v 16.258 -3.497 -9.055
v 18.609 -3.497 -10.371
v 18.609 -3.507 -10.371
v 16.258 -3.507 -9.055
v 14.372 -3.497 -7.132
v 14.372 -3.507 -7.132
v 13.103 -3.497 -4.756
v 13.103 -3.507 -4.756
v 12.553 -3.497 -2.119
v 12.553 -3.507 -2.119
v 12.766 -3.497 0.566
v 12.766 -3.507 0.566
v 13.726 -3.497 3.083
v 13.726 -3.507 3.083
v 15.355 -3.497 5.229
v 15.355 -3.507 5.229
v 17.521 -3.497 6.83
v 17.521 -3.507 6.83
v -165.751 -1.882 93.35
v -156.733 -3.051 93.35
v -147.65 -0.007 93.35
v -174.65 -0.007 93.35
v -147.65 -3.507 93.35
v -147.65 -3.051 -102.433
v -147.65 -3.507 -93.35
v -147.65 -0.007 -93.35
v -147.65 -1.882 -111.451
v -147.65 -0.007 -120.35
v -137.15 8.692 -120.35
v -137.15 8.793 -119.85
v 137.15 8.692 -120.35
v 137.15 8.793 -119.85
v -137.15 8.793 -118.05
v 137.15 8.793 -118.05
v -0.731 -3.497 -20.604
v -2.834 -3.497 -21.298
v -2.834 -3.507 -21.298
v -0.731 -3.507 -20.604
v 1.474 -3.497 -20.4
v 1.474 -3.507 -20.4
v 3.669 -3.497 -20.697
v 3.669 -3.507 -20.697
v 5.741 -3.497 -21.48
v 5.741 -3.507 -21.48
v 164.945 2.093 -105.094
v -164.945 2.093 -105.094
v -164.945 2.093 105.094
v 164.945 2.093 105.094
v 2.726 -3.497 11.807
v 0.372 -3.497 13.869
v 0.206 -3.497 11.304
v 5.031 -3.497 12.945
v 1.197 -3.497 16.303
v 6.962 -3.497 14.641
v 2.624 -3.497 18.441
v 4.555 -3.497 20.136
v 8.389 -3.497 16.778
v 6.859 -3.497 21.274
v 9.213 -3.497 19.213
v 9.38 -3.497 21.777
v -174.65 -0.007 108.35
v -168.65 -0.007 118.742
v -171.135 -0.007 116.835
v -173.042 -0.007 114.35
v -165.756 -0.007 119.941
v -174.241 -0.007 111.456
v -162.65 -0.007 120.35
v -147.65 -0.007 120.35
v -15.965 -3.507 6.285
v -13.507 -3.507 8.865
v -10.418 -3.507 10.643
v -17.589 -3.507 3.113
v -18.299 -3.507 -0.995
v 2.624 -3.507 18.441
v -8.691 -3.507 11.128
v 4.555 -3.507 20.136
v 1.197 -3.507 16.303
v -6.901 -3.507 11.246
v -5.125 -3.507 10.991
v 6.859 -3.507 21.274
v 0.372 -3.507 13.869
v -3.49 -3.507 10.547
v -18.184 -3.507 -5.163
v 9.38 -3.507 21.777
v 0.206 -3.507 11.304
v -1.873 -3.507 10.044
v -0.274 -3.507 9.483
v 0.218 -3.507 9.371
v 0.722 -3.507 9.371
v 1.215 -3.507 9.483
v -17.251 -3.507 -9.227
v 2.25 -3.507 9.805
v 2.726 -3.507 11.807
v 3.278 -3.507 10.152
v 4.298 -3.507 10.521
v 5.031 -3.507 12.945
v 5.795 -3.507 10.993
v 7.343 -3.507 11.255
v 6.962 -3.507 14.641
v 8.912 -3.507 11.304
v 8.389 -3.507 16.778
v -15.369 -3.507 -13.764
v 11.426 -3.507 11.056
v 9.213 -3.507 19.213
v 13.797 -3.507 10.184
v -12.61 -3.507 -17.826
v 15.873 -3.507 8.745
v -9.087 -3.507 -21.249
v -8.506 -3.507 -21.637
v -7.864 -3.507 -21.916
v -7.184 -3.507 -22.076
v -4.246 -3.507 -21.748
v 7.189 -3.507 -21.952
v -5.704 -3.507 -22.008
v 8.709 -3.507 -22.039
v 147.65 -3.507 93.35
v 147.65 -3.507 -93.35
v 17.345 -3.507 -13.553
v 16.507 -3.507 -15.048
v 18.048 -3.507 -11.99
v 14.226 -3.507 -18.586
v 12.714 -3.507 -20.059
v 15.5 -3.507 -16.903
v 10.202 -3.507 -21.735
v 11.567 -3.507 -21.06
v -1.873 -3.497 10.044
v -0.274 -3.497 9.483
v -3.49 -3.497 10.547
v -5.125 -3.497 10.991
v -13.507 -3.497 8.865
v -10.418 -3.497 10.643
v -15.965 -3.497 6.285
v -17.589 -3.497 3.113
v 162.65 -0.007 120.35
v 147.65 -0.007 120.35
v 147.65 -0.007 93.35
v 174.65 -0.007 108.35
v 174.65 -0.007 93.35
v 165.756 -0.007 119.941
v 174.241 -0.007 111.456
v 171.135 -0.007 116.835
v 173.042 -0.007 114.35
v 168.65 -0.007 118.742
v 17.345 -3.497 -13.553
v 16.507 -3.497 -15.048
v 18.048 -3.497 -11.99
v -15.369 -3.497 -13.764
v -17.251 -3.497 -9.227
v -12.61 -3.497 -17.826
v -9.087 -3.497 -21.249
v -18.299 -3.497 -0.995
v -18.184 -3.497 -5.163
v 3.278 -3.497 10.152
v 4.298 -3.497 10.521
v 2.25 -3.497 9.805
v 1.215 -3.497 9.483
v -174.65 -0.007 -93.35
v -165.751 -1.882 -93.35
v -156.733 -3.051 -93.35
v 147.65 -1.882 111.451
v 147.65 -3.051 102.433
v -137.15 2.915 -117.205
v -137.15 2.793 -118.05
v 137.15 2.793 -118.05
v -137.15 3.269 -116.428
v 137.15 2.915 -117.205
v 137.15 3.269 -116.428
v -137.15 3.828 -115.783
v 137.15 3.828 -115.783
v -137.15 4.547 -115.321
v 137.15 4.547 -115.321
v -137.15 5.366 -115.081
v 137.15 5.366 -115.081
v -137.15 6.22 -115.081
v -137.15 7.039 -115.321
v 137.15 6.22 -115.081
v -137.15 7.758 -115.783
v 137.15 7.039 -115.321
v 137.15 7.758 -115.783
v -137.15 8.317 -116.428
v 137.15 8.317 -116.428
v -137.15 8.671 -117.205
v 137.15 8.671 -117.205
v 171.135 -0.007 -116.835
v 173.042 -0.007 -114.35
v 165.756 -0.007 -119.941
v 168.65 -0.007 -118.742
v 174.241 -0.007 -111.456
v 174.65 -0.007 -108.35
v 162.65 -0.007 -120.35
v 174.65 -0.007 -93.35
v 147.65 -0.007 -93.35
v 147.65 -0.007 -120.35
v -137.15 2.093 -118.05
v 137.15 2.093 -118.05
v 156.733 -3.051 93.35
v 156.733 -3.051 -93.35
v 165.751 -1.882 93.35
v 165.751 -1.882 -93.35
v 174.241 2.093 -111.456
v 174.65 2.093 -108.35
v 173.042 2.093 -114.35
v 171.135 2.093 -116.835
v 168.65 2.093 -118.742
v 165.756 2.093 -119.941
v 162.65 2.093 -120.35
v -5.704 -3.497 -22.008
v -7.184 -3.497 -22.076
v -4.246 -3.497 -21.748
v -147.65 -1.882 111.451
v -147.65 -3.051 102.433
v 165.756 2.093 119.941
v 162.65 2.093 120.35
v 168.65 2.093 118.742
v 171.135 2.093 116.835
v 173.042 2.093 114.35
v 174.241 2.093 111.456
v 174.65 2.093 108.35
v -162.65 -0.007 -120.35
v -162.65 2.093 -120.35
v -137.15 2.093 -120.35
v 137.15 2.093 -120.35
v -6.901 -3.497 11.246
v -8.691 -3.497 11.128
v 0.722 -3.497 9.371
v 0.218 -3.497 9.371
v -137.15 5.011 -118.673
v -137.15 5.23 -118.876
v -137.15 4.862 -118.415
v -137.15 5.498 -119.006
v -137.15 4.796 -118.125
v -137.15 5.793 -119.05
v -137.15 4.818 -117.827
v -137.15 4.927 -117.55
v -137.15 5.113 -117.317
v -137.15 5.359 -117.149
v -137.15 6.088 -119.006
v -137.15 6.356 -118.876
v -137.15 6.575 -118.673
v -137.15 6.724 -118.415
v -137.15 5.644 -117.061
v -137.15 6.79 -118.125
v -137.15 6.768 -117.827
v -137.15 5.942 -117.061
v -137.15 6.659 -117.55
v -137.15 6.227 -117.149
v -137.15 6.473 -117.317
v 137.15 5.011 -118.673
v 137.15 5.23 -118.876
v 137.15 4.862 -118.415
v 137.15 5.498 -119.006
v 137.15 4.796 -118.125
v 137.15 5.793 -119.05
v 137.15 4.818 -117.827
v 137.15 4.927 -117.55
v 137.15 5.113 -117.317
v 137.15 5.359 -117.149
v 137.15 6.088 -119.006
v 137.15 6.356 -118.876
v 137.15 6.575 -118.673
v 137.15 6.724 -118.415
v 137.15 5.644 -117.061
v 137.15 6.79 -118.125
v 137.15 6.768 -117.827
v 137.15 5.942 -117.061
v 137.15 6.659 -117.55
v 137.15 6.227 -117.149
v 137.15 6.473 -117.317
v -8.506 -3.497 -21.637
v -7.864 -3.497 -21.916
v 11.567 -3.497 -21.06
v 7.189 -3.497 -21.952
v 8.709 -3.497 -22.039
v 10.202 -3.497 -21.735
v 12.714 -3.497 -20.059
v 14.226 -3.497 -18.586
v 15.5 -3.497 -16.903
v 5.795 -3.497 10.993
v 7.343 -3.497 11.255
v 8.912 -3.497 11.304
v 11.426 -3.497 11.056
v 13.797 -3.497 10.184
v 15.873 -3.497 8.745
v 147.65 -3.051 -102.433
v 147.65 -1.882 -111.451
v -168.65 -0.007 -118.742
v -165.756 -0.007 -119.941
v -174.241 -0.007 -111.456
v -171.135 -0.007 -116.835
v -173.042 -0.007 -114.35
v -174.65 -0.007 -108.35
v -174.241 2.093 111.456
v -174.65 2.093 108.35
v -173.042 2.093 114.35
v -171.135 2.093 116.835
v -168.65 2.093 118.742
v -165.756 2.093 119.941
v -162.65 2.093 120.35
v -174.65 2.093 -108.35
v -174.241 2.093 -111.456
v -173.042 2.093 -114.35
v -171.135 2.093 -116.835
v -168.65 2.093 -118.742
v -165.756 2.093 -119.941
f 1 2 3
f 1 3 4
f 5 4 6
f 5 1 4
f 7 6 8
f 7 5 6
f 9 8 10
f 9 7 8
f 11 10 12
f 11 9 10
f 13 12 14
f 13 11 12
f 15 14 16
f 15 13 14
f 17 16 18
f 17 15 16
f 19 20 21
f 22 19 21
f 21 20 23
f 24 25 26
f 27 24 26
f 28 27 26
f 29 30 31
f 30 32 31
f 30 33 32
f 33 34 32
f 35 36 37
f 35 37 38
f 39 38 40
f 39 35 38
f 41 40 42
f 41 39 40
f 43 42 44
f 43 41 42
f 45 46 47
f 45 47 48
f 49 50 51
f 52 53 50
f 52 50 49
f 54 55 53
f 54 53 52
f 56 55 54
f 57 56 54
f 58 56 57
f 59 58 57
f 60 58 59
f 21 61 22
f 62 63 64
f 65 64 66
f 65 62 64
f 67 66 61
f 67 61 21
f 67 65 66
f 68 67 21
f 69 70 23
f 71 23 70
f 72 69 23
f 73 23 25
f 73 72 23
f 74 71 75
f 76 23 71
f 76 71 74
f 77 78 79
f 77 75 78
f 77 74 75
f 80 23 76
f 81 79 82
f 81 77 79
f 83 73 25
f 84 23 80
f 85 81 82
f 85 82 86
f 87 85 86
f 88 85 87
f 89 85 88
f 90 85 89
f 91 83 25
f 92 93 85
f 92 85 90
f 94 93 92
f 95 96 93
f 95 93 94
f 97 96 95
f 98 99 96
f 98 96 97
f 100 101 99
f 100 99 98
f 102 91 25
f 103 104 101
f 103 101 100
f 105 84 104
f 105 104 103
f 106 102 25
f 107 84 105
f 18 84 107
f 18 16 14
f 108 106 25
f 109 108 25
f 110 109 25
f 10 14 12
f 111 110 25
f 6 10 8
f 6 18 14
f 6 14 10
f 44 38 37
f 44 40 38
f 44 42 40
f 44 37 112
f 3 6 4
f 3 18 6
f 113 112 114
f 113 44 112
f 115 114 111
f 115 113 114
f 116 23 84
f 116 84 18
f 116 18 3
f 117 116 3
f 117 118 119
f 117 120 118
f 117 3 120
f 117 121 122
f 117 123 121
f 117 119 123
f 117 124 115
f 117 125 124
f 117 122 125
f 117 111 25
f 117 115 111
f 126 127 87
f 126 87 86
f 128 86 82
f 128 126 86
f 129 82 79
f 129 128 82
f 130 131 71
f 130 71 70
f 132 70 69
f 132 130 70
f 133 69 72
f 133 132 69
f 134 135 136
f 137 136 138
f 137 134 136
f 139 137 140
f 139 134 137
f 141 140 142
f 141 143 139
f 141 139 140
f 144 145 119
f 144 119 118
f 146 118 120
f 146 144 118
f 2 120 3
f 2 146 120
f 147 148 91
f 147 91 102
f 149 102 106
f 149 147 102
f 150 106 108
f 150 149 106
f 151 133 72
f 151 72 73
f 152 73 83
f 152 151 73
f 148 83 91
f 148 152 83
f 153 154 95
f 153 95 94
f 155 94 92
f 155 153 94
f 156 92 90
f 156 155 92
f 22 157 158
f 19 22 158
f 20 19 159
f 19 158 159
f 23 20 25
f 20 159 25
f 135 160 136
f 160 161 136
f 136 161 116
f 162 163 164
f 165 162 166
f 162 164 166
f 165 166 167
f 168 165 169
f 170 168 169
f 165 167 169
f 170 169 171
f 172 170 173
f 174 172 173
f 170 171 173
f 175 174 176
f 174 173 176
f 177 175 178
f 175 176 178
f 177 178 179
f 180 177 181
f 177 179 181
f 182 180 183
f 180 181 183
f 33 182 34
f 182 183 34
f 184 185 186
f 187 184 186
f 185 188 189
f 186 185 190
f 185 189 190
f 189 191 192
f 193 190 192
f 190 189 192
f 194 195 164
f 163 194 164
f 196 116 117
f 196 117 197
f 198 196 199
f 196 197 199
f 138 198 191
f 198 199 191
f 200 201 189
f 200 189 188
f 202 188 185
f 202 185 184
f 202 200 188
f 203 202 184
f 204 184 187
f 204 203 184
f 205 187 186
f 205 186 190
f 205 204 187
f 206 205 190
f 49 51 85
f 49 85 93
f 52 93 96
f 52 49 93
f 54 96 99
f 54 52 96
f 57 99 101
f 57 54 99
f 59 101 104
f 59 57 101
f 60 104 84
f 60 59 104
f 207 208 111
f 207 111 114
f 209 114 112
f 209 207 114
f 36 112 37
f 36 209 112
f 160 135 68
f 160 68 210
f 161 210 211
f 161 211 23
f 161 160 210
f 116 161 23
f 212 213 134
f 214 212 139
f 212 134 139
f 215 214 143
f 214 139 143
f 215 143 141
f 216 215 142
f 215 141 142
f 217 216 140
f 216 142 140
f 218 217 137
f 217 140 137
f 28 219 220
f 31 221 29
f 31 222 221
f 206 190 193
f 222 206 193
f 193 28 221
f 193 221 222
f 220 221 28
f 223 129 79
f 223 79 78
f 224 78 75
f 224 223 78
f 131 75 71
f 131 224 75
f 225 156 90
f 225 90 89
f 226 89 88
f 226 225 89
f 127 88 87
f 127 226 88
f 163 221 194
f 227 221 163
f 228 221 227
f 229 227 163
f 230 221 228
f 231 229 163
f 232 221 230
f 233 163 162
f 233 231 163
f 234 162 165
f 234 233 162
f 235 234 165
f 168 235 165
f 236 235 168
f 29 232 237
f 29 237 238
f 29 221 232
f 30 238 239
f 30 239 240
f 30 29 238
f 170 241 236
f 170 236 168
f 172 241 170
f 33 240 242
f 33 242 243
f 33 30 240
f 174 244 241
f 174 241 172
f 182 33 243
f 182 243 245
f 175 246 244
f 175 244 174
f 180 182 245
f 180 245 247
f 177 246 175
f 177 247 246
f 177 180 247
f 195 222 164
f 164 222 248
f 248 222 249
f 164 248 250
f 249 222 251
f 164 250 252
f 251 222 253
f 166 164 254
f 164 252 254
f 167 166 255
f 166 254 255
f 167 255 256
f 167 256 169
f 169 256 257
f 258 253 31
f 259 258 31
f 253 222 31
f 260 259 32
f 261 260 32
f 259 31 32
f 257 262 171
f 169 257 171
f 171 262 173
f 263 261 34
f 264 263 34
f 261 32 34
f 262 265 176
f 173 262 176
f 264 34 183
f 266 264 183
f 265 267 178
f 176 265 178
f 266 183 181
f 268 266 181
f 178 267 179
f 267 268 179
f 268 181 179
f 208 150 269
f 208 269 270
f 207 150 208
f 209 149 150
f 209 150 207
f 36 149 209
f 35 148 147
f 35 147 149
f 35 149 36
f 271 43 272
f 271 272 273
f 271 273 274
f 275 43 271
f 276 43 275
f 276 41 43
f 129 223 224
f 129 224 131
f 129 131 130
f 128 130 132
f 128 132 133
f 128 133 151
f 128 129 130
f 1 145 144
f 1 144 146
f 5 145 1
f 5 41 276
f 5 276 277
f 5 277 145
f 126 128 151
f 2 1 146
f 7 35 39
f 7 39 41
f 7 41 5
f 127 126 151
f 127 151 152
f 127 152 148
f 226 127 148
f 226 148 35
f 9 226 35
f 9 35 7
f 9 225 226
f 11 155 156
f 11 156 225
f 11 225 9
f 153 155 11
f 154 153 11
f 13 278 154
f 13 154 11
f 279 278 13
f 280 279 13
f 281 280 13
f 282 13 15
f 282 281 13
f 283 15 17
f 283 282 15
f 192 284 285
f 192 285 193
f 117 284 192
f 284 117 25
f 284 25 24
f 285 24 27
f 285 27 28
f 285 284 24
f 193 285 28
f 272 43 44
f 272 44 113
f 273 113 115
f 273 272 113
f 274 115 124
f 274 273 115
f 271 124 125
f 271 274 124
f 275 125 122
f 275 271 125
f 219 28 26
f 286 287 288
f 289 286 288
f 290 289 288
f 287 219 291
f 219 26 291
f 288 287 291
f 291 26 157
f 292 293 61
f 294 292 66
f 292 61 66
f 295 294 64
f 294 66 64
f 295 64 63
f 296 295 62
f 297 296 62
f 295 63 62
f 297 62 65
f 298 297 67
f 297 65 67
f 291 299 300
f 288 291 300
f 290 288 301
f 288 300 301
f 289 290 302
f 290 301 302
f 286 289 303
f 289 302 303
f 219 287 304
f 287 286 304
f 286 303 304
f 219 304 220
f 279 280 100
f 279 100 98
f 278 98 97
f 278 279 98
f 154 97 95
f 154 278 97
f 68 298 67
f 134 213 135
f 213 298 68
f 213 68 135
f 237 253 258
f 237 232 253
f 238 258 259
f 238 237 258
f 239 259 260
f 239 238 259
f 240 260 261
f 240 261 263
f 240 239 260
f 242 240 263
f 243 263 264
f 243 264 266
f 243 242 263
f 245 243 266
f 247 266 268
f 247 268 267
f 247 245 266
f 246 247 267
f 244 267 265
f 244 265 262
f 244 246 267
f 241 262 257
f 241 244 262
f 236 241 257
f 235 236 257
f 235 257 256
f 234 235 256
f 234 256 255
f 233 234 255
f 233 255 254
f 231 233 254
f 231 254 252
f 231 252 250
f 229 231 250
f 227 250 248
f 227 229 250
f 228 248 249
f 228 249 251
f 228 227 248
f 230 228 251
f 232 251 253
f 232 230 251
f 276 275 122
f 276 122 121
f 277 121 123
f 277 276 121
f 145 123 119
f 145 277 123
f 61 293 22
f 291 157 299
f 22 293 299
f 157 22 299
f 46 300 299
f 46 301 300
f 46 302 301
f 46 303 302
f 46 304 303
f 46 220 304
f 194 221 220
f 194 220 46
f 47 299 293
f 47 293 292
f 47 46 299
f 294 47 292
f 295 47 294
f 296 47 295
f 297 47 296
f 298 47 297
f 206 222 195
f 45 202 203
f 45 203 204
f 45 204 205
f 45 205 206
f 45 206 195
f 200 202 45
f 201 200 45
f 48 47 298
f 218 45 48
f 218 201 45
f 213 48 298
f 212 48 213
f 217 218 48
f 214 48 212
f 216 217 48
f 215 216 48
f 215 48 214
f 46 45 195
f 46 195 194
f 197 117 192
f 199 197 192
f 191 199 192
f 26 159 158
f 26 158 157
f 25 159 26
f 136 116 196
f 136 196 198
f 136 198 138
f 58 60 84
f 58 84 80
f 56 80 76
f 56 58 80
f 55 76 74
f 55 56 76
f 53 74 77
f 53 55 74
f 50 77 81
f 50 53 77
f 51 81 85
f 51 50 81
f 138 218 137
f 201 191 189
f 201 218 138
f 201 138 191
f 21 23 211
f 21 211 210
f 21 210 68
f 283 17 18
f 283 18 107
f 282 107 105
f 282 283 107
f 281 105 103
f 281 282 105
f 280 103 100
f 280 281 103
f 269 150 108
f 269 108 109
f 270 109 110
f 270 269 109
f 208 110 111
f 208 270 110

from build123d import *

# Parameters (mm, degrees)
BOSS_EXTRUDE1_DEPTH   = 174.65
BOSS_EXTRUDE2_DEPTH   = 295.3
BOSS_EXTRUDE2_2_DEPTH = 295.3
CUT_EXTRUDE1_DEPTH    = 564.747214252
FILLET1_R             = 12
CUT_EXTRUDE2_DEPTH    = 3.5
SKETCH6_R             = 1
BOSS_EXTRUDE3_DEPTH   = 137.15
SKETCH7_W             = 329.889597284
SKETCH7_H             = 210.188009182
CUT_EXTRUDE3_DEPTH    = 0.0001
CUT_EXTRUDE4_START    = -0.01
CUT_EXTRUDE4_DEPTH    = 0.01


# Read off the part's stored shape, not the designer's step: Cut-Extrude4
with BuildPart() as part:
    # Sketch1 → Boss-Extrude1 (new, symmetric)
    with BuildSketch(Plane(origin=(0, 0, 0), x_dir=(0, 0, -1), z_dir=(1, 0, 0))):
        with BuildLine():
            Line((120.35, 2.092995949), (-120.35, 2.092995949))
            Line((-120.35, 2.092995949), (-120.35, -0.007004051))
            ThreePointArc((-120.35, -0.007004051), (-106.953525194, -2.555626976), (-93.35, -3.507004051))
            Line((-93.35, -3.507004051), (93.35, -3.507004051))
            ThreePointArc((93.35, -3.507004051), (106.953525194, -2.555626976), (120.35, -0.007004051))
            Line((120.35, -0.007004051), (120.35, 2.092995949))
        make_face()
    extrude(amount=BOSS_EXTRUDE1_DEPTH, both=True)


with BuildPart() as body_2:
    # Sketch3 → Boss-Extrude2 (new body)
    with BuildSketch(Plane(origin=(0, 0, -120.35), x_dir=(-1, 0, 0), z_dir=(0, 0, -1))):
        with BuildLine():
            Line((174.65, -3.507004051), (174.65, -0.007004051))
            ThreePointArc((174.65, -0.007004051), (161.253525194, -2.555626976), (147.65, -3.507004051))
            Line((147.65, -3.507004051), (174.65, -3.507004051))
        make_face()
    extrude(amount=BOSS_EXTRUDE2_DEPTH)


with BuildPart() as body_3:
    # Sketch3 → Boss-Extrude2 2 (new body)
    with BuildSketch(Plane(origin=(0, 0, -120.35), x_dir=(-1, 0, 0), z_dir=(0, 0, -1))):
        with BuildLine():
            Line((-174.65, -3.507004051), (-147.65, -3.507004051))
            ThreePointArc((-147.65, -3.507004051), (-161.253525194, -2.555626976), (-174.65, -0.007004051))
            Line((-174.65, -0.007004051), (-174.65, -3.507004051))
        make_face()
    extrude(amount=BOSS_EXTRUDE2_2_DEPTH)


with BuildPart() as cut_extrude1_tool:
    # Sketch4 → Cut-Extrude1 (new, through all)
    with BuildSketch(Plane(origin=(0, 0, -415.65), x_dir=(-1, 0, 0), z_dir=(0, 0, -1))):
        with BuildLine():
            Line((-174.65, -0.007004051), (-174.65, -3.507004051))
            Line((-174.65, -3.507004051), (-147.65, -3.507004051))
            ThreePointArc((-147.65, -3.507004051), (-161.253525194, -2.555626976), (-174.65, -0.007004051))
        make_face()
        with BuildLine():
            Line((174.65, -3.507004051), (174.65, -0.007004051))
            ThreePointArc((174.65, -0.007004051), (161.253525194, -2.555626976), (147.65, -3.507004051))
            Line((147.65, -3.507004051), (174.65, -3.507004051))
        make_face()
    extrude(amount=-CUT_EXTRUDE1_DEPTH)


with BuildPart() as part_1:
    add(part.part)

    # Cut-Extrude1: cut by cut_extrude1_tool
    add(cut_extrude1_tool.part, mode=Mode.SUBTRACT)

    # Fillet1
    fillet1_edges = [part_1.edges().sort_by_distance(p)[0] for p in [
        (-174.65, 1.042995949, 120.35),
        (-174.65, 1.042995949, -120.35),
        (174.65, 1.042995949, -120.35),
        (174.65, 1.042995949, 120.35),
    ]]
    fillet(fillet1_edges, radius=FILLET1_R)

    # Sketch5 → Cut-Extrude2 (cut)
    with BuildSketch(Plane.XZ.offset(3.507004051)):
        Polygon((147.65, -93.35), (210.030677808, -93.35), (147.65, -135.593204027), align=None)
        Polygon((147.65, 93.35), (239.751162266, 93.35), (147.65, 176.927939597), align=None)
        Polygon((-147.65, -93.35), (-147.65, -130.932477463), (-221.764343706, -93.35), align=None)
        Polygon((-147.65, 93.35), (-147.65, 153.997058362), (-221.764343706, 93.35), align=None)
    extrude(amount=-CUT_EXTRUDE2_DEPTH, mode=Mode.SUBTRACT)

    # Sketch6 → Boss-Extrude3 (add, symmetric)
    with BuildSketch(Plane(origin=(0, 0, 0), x_dir=(0, 0, -1), z_dir=(1, 0, 0))):
        with BuildLine():
            Line((118.05, 2.092995949), (118.05, 2.792995949))
            ThreePointArc((118.05, 2.792995949), (115.05, 5.792995949), (118.05, 8.792995949))
            Line((118.05, 8.792995949), (119.85, 8.792995949))
            Line((119.85, 8.792995949), (120.35, 8.692497192))
            Line((120.35, 8.692497192), (120.35, 2.092995949))
            Line((120.35, 2.092995949), (118.05, 2.092995949))
        make_face()
        with Locations((118.05, 5.792995949)):
            Circle(SKETCH6_R, mode=Mode.SUBTRACT)
    extrude(amount=BOSS_EXTRUDE3_DEPTH, both=True)

    # Sketch7 → Cut-Extrude3 (cut)
    with BuildSketch(Plane(origin=(0, 2.092995949, 0), x_dir=(1, 0, 0), z_dir=(0, 1, 0))):
        Rectangle(SKETCH7_W, SKETCH7_H)
    extrude(amount=-CUT_EXTRUDE3_DEPTH, mode=Mode.SUBTRACT)

    # Cut-Extrude4 outline → Cut-Extrude4 (cut)
    with BuildSketch(Plane.XZ.offset(3.507004051).offset(CUT_EXTRUDE4_START)):
        with BuildLine():
            ThreePointArc((-9.086829944, -21.248513597), (-8.191165567, -21.790889583), (-7.183580977, -22.075774961))
            ThreePointArc((-7.183580977, -22.075774961), (-4.970587657, -21.901814224), (-2.834351243, -21.298410749))
            ThreePointArc((-2.834351243, -21.298410749), (1.47428793, -20.400086874), (5.741103254, -21.479736959))
            ThreePointArc((5.741103254, -21.479736959), (9.465377292, -21.935634067), (12.714193917, -20.058601881))
            ThreePointArc((12.714193917, -20.058601881), (14.894750295, -17.768517515), (16.507432012, -15.048486227))
            ThreePointArc((16.507432012, -15.048486227), (17.713556536, -12.779271655), (18.609414677, -10.370639402))
            ThreePointArc((18.609414677, -10.370639402), (12.55251676, -2.119122901), (17.521225226, 6.829925827))
            ThreePointArc((17.521225226, 6.829925827), (13.797071641, 10.184140705), (8.911774187, 11.303938081))
            ThreePointArc((8.911774187, 11.303938081), (6.564348471, 11.150629708), (4.297695677, 10.521188635))
            ThreePointArc((4.297695677, 10.521188635), (2.765098172, 9.975602694), (1.214652309, 9.48302097))
            ThreePointArc((1.214652309, 9.48302097), (0.470107822, 9.356963669), (-0.274436665, 9.48302097))
            ThreePointArc((-0.274436665, 9.48302097), (-2.679371626, 10.302682573), (-5.125261124, 10.990564736))
            ThreePointArc((-5.125261124, 10.990564736), (-7.799066446, 11.233685421), (-10.418034599, 10.642628414))
            ThreePointArc((-10.418034599, 10.642628414), (-14.82861028, 7.663775104), (-17.589225206, 3.113417964))
            ThreePointArc((-17.589225206, 3.113417964), (-18.344964165, -3.082267775), (-17.251311031, -9.22731342))
            ThreePointArc((-17.251311031, -9.22731342), (-14.092597967, -15.865148937), (-9.086829944, -21.248513597))
        make_face()
        with BuildLine():
            ThreePointArc((9.379881835, 21.777318235), (2.623777692, 18.44062415), (0.205889652, 11.303938081))
            ThreePointArc((0.205889652, 11.303938081), (6.961993795, 14.640632167), (9.379881835, 21.777318235))
        make_face()
    extrude(amount=CUT_EXTRUDE4_DEPTH, mode=Mode.SUBTRACT)


with BuildPart() as body_2_1:
    add(body_2.part)

    # Cut-Extrude1: cut by cut_extrude1_tool
    add(cut_extrude1_tool.part, mode=Mode.SUBTRACT)


with BuildPart() as body_3_1:
    add(body_3.part)

    # Cut-Extrude1: cut by cut_extrude1_tool
    add(cut_extrude1_tool.part, mode=Mode.SUBTRACT)


solid = part_1.part
